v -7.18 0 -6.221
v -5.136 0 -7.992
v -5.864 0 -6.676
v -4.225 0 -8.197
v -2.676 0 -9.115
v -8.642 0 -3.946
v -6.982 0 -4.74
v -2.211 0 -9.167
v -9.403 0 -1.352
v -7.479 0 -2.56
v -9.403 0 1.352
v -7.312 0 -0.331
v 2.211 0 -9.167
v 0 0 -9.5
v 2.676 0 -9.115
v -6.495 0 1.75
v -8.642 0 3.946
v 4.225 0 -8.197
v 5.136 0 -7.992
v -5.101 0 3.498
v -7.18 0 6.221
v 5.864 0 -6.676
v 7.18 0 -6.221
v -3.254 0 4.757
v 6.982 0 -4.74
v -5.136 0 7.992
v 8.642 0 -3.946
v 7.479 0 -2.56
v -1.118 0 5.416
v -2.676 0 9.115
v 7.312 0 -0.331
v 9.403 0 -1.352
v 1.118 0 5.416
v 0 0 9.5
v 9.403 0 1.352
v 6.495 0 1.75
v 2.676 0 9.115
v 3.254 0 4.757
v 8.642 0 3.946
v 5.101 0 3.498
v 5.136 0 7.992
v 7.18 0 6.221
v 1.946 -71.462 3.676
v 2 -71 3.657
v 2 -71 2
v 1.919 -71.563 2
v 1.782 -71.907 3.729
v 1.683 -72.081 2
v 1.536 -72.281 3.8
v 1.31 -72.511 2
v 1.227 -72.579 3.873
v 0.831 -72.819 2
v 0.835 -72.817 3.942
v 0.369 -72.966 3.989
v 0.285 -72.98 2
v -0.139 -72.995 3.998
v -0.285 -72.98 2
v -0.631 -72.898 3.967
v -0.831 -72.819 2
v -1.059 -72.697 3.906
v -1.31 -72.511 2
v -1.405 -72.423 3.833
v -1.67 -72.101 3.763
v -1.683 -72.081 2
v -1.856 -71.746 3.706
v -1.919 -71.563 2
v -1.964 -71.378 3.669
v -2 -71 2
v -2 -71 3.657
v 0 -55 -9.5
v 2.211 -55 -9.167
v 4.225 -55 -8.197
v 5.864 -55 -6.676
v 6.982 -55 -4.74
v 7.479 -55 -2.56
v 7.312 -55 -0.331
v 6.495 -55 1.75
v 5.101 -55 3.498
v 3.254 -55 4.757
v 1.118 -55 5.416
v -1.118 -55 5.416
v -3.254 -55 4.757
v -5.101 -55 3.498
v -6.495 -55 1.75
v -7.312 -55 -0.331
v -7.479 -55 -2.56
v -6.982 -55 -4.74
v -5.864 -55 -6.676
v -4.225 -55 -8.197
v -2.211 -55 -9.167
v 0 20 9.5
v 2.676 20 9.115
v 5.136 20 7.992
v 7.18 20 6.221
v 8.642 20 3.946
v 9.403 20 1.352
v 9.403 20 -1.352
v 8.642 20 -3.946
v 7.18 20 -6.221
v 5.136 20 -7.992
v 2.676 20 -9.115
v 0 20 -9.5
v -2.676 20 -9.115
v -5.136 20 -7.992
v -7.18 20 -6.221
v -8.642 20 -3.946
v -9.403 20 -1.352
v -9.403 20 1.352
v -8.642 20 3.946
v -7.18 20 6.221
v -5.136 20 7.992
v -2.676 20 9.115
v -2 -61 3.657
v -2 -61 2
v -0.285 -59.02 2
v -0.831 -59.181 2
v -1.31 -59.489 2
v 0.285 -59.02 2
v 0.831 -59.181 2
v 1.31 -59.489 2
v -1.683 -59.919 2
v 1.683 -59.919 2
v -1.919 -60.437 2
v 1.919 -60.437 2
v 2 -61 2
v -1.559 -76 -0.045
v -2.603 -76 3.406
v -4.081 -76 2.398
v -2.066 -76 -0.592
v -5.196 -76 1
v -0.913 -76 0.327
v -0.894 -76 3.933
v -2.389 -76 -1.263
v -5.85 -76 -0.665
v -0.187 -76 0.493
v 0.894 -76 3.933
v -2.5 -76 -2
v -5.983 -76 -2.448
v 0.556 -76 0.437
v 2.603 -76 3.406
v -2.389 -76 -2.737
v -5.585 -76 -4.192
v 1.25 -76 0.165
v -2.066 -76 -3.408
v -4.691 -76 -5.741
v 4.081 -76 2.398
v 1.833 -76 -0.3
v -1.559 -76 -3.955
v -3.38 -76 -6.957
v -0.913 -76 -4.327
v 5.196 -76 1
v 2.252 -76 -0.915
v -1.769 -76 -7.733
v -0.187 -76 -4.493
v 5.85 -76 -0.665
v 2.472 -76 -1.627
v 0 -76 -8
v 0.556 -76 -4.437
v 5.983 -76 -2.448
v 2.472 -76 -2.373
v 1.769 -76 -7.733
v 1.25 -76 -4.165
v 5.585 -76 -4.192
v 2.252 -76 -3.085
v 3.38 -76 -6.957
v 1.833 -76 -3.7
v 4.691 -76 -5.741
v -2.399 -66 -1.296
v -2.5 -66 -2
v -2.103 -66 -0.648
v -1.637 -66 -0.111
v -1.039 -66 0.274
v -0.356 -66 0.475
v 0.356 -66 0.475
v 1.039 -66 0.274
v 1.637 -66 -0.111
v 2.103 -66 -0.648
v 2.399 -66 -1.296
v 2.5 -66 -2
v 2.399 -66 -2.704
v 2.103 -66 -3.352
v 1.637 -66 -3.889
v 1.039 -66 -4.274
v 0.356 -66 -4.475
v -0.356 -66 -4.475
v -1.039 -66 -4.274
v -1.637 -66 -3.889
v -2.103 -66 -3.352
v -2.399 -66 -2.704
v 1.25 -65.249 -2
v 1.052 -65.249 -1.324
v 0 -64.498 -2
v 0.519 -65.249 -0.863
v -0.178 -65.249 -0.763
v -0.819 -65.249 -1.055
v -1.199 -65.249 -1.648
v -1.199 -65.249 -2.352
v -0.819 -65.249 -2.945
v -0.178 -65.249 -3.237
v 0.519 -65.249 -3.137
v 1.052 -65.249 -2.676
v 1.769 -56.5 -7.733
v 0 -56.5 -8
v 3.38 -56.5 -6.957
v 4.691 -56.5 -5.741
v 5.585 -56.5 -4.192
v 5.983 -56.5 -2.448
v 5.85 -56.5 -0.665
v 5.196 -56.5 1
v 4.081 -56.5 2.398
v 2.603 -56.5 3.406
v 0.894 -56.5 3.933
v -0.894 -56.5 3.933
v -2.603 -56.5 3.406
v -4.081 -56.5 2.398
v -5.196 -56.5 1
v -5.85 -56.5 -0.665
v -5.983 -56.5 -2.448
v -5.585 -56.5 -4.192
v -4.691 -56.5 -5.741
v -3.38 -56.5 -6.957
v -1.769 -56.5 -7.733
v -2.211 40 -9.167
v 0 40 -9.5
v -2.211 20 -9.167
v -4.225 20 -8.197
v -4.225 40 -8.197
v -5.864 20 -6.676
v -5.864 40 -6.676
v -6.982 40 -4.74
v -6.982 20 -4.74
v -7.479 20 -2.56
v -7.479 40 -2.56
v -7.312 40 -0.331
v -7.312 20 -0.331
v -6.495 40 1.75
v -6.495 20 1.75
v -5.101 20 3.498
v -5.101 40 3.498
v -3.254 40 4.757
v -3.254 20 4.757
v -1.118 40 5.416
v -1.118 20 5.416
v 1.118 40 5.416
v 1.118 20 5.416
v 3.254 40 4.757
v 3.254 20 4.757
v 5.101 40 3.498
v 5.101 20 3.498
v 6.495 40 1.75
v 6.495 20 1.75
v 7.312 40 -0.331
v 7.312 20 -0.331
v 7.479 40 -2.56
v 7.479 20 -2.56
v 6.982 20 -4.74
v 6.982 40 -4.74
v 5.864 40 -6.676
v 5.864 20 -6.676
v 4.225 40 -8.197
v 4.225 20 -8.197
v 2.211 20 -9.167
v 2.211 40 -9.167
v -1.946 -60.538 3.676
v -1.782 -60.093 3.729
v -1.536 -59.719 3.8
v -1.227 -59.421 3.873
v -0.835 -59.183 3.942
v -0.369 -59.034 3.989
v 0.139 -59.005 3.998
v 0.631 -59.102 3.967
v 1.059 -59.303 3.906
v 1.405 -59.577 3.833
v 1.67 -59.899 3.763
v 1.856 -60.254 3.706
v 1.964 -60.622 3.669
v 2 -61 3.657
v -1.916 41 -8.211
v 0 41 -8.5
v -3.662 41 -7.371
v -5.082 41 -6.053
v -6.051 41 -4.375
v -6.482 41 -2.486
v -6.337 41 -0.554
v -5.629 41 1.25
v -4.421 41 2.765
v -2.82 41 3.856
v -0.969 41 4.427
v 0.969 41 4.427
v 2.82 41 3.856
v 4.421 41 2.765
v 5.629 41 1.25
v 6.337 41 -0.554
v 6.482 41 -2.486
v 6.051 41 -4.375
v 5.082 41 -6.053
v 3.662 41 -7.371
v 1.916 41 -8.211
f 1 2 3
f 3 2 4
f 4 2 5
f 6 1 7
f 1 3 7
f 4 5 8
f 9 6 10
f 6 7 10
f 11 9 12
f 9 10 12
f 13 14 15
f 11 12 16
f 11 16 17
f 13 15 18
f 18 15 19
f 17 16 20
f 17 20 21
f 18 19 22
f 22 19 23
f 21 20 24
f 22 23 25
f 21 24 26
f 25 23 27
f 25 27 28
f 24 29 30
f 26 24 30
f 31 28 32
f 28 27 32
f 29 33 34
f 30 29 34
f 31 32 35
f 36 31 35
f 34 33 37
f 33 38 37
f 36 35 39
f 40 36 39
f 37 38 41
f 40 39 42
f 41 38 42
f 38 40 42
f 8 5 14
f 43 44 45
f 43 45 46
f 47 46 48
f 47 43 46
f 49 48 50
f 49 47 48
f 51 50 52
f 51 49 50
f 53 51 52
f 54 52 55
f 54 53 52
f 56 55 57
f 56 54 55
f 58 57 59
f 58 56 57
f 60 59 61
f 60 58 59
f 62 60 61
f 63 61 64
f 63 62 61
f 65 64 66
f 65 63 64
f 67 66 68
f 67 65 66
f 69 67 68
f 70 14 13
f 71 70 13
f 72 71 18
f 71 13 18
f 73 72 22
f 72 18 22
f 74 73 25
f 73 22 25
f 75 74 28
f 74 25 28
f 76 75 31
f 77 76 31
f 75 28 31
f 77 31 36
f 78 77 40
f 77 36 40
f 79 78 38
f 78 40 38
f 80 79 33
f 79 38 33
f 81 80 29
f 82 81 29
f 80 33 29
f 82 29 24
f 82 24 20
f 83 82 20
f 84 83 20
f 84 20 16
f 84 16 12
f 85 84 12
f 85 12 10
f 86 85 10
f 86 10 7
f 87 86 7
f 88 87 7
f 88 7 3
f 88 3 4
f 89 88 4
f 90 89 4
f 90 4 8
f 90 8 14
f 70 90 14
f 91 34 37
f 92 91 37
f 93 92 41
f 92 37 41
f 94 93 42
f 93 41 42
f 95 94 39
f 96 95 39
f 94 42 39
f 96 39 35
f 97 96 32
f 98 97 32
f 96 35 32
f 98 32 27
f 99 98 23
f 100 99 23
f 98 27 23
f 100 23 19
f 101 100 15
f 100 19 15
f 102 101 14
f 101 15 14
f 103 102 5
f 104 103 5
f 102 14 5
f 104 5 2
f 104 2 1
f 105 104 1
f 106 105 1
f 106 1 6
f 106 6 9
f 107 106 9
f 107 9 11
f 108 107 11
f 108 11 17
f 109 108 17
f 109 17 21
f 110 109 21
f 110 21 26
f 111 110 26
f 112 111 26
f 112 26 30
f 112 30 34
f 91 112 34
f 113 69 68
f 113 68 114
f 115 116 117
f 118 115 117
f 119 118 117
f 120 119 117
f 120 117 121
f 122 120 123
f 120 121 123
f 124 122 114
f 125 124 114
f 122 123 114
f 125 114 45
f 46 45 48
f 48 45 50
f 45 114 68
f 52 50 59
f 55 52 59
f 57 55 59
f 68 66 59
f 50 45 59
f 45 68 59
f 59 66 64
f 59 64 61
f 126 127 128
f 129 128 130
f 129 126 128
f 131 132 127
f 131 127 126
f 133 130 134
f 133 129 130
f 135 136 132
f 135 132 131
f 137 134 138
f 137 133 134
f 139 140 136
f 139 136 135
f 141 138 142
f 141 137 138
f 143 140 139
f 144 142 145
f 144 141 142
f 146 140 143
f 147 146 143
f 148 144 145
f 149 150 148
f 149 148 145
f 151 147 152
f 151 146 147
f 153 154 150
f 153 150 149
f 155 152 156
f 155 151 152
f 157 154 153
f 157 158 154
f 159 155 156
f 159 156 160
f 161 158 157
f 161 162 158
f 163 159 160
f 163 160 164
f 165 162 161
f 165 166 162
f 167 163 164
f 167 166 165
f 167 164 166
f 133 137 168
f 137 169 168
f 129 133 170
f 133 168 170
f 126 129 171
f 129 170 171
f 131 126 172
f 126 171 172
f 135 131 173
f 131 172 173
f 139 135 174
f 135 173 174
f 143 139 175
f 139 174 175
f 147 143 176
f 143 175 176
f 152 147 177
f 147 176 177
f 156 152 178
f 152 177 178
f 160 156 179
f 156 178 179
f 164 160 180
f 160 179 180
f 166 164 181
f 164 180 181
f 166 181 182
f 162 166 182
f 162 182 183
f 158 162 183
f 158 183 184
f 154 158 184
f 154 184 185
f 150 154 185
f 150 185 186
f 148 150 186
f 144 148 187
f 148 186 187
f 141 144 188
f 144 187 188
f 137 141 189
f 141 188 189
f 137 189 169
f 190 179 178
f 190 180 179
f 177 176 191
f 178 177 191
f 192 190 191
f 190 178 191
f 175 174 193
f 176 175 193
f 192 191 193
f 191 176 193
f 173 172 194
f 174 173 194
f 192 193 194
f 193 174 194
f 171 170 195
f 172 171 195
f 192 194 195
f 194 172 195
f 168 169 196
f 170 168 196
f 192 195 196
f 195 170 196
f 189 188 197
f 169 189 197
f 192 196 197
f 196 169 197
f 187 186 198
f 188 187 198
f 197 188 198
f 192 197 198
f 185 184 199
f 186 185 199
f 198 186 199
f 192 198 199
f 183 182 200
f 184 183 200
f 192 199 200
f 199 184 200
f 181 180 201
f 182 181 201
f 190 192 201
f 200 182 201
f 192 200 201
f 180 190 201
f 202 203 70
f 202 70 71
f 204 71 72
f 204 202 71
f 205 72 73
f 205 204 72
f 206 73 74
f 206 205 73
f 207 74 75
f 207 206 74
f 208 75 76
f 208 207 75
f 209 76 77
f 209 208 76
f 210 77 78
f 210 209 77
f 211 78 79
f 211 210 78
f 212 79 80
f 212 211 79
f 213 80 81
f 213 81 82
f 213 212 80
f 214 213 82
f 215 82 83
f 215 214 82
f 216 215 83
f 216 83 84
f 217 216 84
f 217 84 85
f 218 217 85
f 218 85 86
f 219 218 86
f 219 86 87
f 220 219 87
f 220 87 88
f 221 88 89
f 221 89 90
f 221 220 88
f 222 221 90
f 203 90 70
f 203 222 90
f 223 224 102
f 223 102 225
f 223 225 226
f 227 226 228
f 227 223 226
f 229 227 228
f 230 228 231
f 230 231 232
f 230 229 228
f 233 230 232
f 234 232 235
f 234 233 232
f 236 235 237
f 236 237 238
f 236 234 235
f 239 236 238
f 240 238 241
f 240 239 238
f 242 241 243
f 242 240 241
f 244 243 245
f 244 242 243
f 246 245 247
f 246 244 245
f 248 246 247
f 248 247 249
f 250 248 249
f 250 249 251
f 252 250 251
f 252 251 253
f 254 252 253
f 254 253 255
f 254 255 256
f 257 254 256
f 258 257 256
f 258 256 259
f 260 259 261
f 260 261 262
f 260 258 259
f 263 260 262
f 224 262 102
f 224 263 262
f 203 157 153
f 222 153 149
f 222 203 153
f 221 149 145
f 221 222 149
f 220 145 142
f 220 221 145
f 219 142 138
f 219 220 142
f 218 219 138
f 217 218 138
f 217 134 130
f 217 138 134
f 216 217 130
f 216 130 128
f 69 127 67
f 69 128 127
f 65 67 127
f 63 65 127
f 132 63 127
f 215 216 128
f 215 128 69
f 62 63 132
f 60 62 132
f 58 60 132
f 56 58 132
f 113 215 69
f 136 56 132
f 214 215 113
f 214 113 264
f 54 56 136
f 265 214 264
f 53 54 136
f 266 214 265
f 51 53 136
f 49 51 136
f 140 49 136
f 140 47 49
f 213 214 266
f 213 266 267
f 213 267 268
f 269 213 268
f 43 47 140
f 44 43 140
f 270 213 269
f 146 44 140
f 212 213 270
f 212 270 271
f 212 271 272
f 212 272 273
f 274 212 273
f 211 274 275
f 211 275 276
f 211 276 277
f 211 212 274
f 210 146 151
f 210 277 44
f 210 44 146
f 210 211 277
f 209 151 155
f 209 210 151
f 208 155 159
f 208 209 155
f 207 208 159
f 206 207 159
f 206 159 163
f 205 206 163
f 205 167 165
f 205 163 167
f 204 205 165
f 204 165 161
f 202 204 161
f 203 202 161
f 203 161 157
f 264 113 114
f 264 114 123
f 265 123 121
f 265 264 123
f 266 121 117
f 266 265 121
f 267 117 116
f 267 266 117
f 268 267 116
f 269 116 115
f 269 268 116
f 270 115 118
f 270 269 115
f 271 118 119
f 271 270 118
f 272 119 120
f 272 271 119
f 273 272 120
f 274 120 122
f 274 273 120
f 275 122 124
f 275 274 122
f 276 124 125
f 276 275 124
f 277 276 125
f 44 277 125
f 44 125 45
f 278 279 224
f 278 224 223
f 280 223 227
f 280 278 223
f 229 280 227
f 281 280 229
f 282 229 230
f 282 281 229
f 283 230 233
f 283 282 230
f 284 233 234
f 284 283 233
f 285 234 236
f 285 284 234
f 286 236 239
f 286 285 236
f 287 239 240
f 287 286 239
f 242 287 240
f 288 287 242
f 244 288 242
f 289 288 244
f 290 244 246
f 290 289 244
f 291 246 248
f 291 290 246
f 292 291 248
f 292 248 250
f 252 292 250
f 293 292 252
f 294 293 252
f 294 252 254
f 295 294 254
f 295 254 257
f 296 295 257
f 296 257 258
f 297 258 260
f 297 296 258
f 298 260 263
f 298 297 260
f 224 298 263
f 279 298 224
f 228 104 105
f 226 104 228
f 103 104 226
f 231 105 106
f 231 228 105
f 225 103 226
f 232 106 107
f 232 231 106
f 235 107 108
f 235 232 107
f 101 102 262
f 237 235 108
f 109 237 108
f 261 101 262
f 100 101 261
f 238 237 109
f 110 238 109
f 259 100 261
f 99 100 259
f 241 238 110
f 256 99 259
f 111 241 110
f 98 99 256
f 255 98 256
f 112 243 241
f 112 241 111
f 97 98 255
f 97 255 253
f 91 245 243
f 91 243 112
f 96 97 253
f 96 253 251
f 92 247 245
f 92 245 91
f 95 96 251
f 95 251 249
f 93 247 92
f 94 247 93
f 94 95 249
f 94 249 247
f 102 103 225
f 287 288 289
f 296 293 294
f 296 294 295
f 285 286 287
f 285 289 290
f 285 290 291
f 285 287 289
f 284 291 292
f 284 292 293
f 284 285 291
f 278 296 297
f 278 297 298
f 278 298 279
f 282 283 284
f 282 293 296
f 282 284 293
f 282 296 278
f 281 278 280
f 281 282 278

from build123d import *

# Parameters (mm, degrees)
SKETCH1_R                   = 9.5
BOSS_EXTRUDE1_DEPTH         = 20
SKETCH2_R                   = 7.5
BOSS_EXTRUDE2_DEPTH         = 58
SKETCH3_R                   = 6
BOSS_EXTRUDE3_DEPTH         = 18
BOSS_EXTRUDE4_START         = 21
SKETCH4_R                   = 7.5
BOSS_EXTRUDE4_DEPTH         = 21
CUT_EXTRUDE1_DEPTH          = 2
TAP_DRILL_FOR_M4_TAP1_D     = 5
TAP_DRILL_FOR_M4_TAP1_DEPTH = 10
TAP_DRILL_FOR_M4_TAP1_TIP   = 1.502151548
CHAMFER1_SIZE               = 1
CHAMFER2_SIZE               = 3


with BuildPart() as part:
    # Sketch1 → Boss-Extrude1 (new body)
    with BuildSketch(Plane(origin=(0, 0, 0), x_dir=(-1, 0, 0), z_dir=(0, 1, 0))):
        with Locations(Location((0, 0, 0), (0, 0, 90))):
            Circle(SKETCH1_R)
    extrude(amount=BOSS_EXTRUDE1_DEPTH)

    # Sketch2 → Boss-Extrude2 (add)
    with BuildSketch(Plane.XZ):
        with Locations(Location((0, -2, 0), (0, 0, 270))):
            Circle(SKETCH2_R)
    extrude(amount=BOSS_EXTRUDE2_DEPTH)

    # Sketch3 → Boss-Extrude3 (add)
    with BuildSketch(Plane.XZ.offset(58)):
        with Locations(Location((0, -2, 0), (0, 0, 270))):
            Circle(SKETCH3_R)
    extrude(amount=BOSS_EXTRUDE3_DEPTH)

    # Sketch4 → Boss-Extrude4 (add)
    with BuildSketch(Plane(origin=(0, 20, 0), x_dir=(-1, 0, 0), z_dir=(0, 1, 0)).offset(BOSS_EXTRUDE4_START)):
        with Locations(Location((0, -2, 0), (0, 0, 270))):
            Circle(SKETCH4_R)
    extrude(amount=-BOSS_EXTRUDE4_DEPTH)

    # Sketch5 → Cut-Extrude1 (cut)
    with BuildSketch(Plane(origin=(0, 0, 4), x_dir=(0, 1, 0), z_dir=(0, 0, 1))):
        with BuildLine():
            Line((-71, 2), (-61, 2))
            ThreePointArc((-61, 2), (-59, 0), (-61, -2))
            Line((-61, -2), (-71, -2))
            ThreePointArc((-71, -2), (-73, 0), (-71, 2))
        make_face()
    extrude(amount=-CUT_EXTRUDE1_DEPTH, mode=Mode.SUBTRACT)

    # Tap Drill for M4 Tap1
    with Locations(Plane.XZ.offset(76)):
        with Locations((0, -2)):
            Hole(TAP_DRILL_FOR_M4_TAP1_D / 2, depth=TAP_DRILL_FOR_M4_TAP1_DEPTH)
            with Locations((0, 0, -(TAP_DRILL_FOR_M4_TAP1_DEPTH + TAP_DRILL_FOR_M4_TAP1_TIP / 2))):  # 118° drill point
                Cone(0, TAP_DRILL_FOR_M4_TAP1_D / 2, TAP_DRILL_FOR_M4_TAP1_TIP, mode=Mode.SUBTRACT)

    # Chamfer1
    chamfer1_edges = [part.edges().sort_by_distance(p)[0] for p in [
        (0, 41, 5.5),
    ]]
    chamfer(chamfer1_edges, length=CHAMFER1_SIZE)

    # Chamfer2
    # the kernel refuses this chamfer: 3 mm, written as the material it takes off along each edge
    with BuildSketch(Plane(origin=(0, -58, -2), x_dir=(0, 0, -1), z_dir=(-1, 0, 0))) as chamfer2_piece_1_section:
        Polygon((7.5, -CHAMFER2_SIZE), (7.5 - CHAMFER2_SIZE, 0), (7.5, 0), align=None)
    chamfer2_piece_1 = revolve(axis=Axis((0, -58, -2), (0, -1, 0)), mode=Mode.PRIVATE)
    chamfer2_piece_1 = chamfer2_piece_1 - Plane(origin=(0, -55.74588243, -2), x_dir=(0, 0, -1), z_dir=(0, 1, 0)) * Cylinder(6, 30, mode=Mode.PRIVATE)
    add(chamfer2_piece_1, mode=Mode.SUBTRACT)


solid = part.part
